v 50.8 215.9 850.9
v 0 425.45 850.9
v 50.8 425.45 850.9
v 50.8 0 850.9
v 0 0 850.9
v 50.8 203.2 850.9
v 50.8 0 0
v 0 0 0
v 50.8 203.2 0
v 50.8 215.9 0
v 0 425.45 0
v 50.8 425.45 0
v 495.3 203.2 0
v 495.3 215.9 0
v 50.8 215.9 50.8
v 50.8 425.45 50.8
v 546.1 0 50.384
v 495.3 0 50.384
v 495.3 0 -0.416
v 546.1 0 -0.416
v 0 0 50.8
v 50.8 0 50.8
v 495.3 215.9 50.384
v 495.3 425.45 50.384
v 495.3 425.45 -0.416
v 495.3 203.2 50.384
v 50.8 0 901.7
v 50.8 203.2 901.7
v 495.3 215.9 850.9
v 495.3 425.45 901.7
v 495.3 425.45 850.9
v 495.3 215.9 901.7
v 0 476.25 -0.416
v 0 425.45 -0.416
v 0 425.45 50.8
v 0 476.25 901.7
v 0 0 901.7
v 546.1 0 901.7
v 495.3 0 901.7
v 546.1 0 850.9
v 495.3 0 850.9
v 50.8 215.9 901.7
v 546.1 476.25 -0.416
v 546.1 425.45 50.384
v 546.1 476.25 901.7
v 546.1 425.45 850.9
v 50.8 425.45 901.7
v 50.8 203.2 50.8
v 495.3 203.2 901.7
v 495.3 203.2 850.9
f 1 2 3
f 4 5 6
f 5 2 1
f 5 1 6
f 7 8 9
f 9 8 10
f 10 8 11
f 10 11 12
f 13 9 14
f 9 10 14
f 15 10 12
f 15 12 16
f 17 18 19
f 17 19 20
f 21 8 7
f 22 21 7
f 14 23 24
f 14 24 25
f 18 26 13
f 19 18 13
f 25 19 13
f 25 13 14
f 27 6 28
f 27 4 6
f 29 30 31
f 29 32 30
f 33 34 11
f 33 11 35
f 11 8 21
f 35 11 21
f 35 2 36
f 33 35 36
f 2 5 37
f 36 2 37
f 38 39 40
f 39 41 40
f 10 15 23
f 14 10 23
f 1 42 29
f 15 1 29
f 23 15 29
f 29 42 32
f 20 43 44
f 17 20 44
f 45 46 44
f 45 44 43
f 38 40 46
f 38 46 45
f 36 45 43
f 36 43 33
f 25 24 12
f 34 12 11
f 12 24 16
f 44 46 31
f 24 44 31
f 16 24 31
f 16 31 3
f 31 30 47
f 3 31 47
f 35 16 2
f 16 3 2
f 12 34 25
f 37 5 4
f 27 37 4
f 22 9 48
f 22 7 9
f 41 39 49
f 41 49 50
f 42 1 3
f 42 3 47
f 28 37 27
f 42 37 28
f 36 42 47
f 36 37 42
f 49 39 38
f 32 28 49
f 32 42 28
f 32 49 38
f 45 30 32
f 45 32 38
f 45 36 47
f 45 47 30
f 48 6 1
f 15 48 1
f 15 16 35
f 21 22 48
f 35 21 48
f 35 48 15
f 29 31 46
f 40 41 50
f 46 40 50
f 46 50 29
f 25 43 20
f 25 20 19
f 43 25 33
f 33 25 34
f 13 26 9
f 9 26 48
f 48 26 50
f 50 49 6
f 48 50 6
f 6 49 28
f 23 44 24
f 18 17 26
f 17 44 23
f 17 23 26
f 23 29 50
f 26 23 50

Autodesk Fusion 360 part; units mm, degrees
sketch "Sketch1" plane through (0, 0, 0) normal (0, 1, 0) x (1, 0, 0)
  line L0 (0, 0) -> (50.8, 0)
  line L1 (50.8, 0) -> (50.8, -50.8)
  line L2 (50.8, -50.8) -> (0, -50.8)
  line L3 (0, -50.8) -> (0, 0)
  line L4 (0, -850.9) -> (50.8, -850.9)
  line L5 (50.8, -850.9) -> (50.8, -901.7)
  line L6 (50.8, -901.7) -> (0, -901.7)
  line L7 (0, -901.7) -> (0, -850.9)
  line L8 (0, -50.8) -> (0, 0)
  line L9 (50.8, 0) -> (50.8, -50.8)
  line L10 (0, 0) -> (50.8, 0)
  line L11 (50.8, -50.8) -> (0, -50.8)
  line L12 (546.1, -50.3836) -> (495.3, -50.3836)
  line L13 (546.1, 0.4164) -> (546.1, -50.3836)
  line L14 (495.3, 0.4164) -> (546.1, 0.4164)
  line L15 (495.3, -50.3836) -> (495.3, 0.4164)
  line L16 (495.3, -850.9) -> (546.1, -850.9)
  line L17 (546.1, -850.9) -> (546.1, -901.7)
  line L18 (546.1, -901.7) -> (495.3, -901.7)
  line L19 (495.3, -901.7) -> (495.3, -850.9)
  dimension "d1" = 50.8
  dimension "d2" = 50.8
  dimension "d3" = 50.8
  dimension "d4" = 50.8
  dimension "d5" = 800.1
  dimension "d6" = 50.8
  dimension "d7" = 50.8
  dimension "d8" = 50.8
  dimension "d9" = 50.8
  dimension "d10" = 444.5
  dimension "d11" = 50.8
  dimension "d12" = 50.8
extrude "Extrude1" add sketch "Sketch1" along normal blind 425.45 makes body 1 at (512.2333, 141.8167, 850.9) makes body 2 at (529.1667, 141.8167, 50.3836) makes body 3 at (16.9333, 141.8167, 850.9) makes body 4 at (16.9333, 141.8167, 0)
sketch "Sketch2" plane through (0, 425.45, 0) normal (0, 1, 0) x (-1, 0, 0)
  line L0 (0, 901.7) -> (-50.8, 901.7)
  line L1 (-50.8, 901.7) -> (-50.8, 850.9)
  line L2 (-50.8, 850.9) -> (0, 850.9)
  line L3 (0, 850.9) -> (0, 901.7)
  line L4 (0, 901.7) -> (-546.1, 901.7)
  line L5 (-546.1, 901.7) -> (-546.1, -0.4164)
  line L6 (-546.1, -0.4164) -> (0, -0.4164)
  line L7 (0, -0.4164) -> (0, 901.7)
  point P0 (-546.1, -0.4164)
extrude "Extrude2" add sketch "Sketch2" along normal blind 50.8 bodies 1 2 3 4
sketch "Sketch3" plane through (0, 0, 901.7) normal (0, 0, 1) x (1, 0, 0)
  line L0 (495.3, 0) -> (546.1, 0)
  line L1 (546.1, 0) -> (546.1, 476.25)
  line L2 (546.1, 476.25) -> (0, 476.25)
  line L3 (0, 476.25) -> (0, 0)
  line L4 (0, 0) -> (50.8, 0)
  line L5 (50.8, 0) -> (50.8, 425.45)
  line L6 (50.8, 425.45) -> (495.3, 425.45)
  line L7 (495.3, 425.45) -> (495.3, 0)
  line L8 (50.8, 215.9) -> (495.3, 215.9)
  line L9 (495.3, 215.9) -> (495.3, 203.2)
  line L10 (495.3, 203.2) -> (50.8, 203.2)
  line L11 (50.8, 203.2) -> (50.8, 215.9)
  dimension "d22" = 444.5
  dimension "d23" = 12.7
  dimension "d24" = 203.2
extrude "Extrude3" add sketch "Sketch3" against normal blind 901.7 contours L5 L7 L8 L9 L10 L11 bodies 1
